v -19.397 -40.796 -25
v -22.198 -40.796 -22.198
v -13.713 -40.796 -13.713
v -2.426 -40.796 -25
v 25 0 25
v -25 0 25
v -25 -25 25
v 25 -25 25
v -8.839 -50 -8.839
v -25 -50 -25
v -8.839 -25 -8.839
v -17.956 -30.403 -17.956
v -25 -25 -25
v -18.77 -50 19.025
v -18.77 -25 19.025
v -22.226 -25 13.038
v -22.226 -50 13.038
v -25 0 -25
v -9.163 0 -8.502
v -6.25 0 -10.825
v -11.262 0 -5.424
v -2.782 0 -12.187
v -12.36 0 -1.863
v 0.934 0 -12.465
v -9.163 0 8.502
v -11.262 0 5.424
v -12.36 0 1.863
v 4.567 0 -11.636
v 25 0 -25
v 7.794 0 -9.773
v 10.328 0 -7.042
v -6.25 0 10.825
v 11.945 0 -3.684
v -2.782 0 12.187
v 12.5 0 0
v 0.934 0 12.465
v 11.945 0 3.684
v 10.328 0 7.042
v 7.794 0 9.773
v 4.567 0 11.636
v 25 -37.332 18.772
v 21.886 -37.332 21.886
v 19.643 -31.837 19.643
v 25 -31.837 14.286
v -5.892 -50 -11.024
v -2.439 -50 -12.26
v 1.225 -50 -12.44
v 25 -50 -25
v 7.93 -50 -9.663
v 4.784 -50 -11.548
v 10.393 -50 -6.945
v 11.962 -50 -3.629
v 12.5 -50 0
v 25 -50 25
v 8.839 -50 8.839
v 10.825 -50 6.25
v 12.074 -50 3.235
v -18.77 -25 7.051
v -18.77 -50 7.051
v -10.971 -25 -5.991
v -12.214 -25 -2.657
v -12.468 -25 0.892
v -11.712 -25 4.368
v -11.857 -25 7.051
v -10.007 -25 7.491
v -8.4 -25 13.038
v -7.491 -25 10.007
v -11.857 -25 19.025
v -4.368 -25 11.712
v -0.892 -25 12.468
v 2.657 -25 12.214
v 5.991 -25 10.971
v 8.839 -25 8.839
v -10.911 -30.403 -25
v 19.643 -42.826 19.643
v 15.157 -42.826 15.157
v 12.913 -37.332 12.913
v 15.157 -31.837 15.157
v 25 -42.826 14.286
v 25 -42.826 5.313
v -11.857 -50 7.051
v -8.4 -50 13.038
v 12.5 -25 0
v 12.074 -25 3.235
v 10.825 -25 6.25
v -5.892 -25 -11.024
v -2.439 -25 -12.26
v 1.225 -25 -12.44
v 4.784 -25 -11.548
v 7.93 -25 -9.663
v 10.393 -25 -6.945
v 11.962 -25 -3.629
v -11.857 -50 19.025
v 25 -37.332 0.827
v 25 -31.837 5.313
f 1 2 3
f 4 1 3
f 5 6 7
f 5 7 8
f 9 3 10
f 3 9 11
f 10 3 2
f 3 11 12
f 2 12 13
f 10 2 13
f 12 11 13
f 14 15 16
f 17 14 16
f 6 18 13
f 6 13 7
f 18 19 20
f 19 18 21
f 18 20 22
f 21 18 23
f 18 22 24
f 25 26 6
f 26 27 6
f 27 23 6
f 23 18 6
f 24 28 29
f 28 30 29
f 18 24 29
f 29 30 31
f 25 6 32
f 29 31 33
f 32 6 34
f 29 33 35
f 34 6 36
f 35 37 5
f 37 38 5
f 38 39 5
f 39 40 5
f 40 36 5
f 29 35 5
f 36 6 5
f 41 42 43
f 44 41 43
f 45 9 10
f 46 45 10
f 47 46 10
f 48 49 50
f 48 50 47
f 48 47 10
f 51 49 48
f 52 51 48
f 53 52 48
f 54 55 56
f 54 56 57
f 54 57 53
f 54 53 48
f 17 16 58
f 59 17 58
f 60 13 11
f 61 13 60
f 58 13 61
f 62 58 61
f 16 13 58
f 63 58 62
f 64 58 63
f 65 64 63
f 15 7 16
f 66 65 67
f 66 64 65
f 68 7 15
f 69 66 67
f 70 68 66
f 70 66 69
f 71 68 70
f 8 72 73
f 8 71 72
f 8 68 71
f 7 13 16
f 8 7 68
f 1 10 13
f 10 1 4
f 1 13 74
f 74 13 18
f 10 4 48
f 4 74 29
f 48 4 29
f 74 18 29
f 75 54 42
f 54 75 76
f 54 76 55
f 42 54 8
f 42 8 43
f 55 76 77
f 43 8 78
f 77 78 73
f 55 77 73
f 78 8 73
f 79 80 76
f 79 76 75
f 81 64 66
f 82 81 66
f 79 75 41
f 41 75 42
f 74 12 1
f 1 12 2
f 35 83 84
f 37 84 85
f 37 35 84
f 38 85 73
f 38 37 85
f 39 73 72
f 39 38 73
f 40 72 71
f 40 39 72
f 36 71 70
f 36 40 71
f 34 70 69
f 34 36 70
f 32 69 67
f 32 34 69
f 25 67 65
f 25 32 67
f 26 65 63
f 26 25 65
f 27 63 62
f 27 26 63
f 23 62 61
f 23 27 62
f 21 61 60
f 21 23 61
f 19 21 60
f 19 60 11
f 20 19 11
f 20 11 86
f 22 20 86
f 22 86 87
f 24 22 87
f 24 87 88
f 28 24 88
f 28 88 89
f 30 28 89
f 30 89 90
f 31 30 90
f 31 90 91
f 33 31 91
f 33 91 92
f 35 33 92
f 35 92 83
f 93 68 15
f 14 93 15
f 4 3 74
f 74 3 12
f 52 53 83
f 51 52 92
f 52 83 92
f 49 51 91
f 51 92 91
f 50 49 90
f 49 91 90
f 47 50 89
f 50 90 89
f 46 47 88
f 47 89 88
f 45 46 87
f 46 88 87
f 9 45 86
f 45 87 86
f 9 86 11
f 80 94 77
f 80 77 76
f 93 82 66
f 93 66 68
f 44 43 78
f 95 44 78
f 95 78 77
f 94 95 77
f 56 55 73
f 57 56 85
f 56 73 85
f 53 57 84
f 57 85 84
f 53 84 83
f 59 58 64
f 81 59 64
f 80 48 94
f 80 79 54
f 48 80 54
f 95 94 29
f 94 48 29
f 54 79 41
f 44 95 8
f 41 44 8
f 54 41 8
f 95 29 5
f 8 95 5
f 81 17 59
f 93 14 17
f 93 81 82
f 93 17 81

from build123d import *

# Parameters (mm, degrees)
F0_W     = 50
F0_H     = 50
F0_R     = 12.5
F1_DEPTH = 25
F3_DEPTH = 25
F5_DEPTH = 50
F7_DEPTH = 25


with BuildPart() as f1:
    # F0 (on Front) → F1 (new body)
    with BuildSketch(Plane.XZ):
        Rectangle(F0_W, F0_H)
        Circle(F0_R, mode=Mode.SUBTRACT)
    extrude(amount=F1_DEPTH)

    # F2 (on face) → F3 (join)
    with BuildSketch(Plane.XZ.offset(25)):
        with BuildLine():
            Line((-8.8388347648, -8.8388347648), (-25, -25))
            Line((-25, -25), (25, -25))
            Line((25, -25), (25, 25))
            Line((25, 25), (8.8388347648, 8.8388347648))
            ThreePointArc((8.8388347648, 8.8388347648), (11.5484941564, 4.7835429046), (12.5, 0))
            ThreePointArc((12.5, 0), (4.7835429046, -11.5484941564), (-8.8388347648, -8.8388347648))
        make_face()
    extrude(amount=F3_DEPTH)

    # F4 (on face) → F5 (cut)
    with BuildSketch(Plane(origin=(0, 0, 0), x_dir=(0, -1, 0), z_dir=(-0.7071067812, 0, 0.7071067812))):
        Polygon((40.7957995796, -31.3931250338), (40.7957995796, -19.3931250338), (30.4034947342, -25.3931250338), align=None)
        Polygon((42.8262037943, 21.4346205463), (42.8262037943, 27.7791293861), (37.3316979645, 30.951383806), (31.8371921347, 27.7791293861), (31.8371921347, 21.4346205463), (37.3316979645, 18.2623661264), align=None)
    extrude(amount=-F5_DEPTH, mode=Mode.SUBTRACT)

    # F6 (on face) → F7 (join)
    with BuildSketch(Plane.XZ.offset(25)):
        Polygon((-11.8569600062, 19.0248098224), (-18.7698883339, 19.0248098224), (-22.2263524977, 13.0380382761), (-18.7698883339, 7.0512667298), (-11.8569600062, 7.0512667298), (-8.4004958423, 13.0380382761), align=None)
    extrude(amount=F7_DEPTH)


solid = f1.part
